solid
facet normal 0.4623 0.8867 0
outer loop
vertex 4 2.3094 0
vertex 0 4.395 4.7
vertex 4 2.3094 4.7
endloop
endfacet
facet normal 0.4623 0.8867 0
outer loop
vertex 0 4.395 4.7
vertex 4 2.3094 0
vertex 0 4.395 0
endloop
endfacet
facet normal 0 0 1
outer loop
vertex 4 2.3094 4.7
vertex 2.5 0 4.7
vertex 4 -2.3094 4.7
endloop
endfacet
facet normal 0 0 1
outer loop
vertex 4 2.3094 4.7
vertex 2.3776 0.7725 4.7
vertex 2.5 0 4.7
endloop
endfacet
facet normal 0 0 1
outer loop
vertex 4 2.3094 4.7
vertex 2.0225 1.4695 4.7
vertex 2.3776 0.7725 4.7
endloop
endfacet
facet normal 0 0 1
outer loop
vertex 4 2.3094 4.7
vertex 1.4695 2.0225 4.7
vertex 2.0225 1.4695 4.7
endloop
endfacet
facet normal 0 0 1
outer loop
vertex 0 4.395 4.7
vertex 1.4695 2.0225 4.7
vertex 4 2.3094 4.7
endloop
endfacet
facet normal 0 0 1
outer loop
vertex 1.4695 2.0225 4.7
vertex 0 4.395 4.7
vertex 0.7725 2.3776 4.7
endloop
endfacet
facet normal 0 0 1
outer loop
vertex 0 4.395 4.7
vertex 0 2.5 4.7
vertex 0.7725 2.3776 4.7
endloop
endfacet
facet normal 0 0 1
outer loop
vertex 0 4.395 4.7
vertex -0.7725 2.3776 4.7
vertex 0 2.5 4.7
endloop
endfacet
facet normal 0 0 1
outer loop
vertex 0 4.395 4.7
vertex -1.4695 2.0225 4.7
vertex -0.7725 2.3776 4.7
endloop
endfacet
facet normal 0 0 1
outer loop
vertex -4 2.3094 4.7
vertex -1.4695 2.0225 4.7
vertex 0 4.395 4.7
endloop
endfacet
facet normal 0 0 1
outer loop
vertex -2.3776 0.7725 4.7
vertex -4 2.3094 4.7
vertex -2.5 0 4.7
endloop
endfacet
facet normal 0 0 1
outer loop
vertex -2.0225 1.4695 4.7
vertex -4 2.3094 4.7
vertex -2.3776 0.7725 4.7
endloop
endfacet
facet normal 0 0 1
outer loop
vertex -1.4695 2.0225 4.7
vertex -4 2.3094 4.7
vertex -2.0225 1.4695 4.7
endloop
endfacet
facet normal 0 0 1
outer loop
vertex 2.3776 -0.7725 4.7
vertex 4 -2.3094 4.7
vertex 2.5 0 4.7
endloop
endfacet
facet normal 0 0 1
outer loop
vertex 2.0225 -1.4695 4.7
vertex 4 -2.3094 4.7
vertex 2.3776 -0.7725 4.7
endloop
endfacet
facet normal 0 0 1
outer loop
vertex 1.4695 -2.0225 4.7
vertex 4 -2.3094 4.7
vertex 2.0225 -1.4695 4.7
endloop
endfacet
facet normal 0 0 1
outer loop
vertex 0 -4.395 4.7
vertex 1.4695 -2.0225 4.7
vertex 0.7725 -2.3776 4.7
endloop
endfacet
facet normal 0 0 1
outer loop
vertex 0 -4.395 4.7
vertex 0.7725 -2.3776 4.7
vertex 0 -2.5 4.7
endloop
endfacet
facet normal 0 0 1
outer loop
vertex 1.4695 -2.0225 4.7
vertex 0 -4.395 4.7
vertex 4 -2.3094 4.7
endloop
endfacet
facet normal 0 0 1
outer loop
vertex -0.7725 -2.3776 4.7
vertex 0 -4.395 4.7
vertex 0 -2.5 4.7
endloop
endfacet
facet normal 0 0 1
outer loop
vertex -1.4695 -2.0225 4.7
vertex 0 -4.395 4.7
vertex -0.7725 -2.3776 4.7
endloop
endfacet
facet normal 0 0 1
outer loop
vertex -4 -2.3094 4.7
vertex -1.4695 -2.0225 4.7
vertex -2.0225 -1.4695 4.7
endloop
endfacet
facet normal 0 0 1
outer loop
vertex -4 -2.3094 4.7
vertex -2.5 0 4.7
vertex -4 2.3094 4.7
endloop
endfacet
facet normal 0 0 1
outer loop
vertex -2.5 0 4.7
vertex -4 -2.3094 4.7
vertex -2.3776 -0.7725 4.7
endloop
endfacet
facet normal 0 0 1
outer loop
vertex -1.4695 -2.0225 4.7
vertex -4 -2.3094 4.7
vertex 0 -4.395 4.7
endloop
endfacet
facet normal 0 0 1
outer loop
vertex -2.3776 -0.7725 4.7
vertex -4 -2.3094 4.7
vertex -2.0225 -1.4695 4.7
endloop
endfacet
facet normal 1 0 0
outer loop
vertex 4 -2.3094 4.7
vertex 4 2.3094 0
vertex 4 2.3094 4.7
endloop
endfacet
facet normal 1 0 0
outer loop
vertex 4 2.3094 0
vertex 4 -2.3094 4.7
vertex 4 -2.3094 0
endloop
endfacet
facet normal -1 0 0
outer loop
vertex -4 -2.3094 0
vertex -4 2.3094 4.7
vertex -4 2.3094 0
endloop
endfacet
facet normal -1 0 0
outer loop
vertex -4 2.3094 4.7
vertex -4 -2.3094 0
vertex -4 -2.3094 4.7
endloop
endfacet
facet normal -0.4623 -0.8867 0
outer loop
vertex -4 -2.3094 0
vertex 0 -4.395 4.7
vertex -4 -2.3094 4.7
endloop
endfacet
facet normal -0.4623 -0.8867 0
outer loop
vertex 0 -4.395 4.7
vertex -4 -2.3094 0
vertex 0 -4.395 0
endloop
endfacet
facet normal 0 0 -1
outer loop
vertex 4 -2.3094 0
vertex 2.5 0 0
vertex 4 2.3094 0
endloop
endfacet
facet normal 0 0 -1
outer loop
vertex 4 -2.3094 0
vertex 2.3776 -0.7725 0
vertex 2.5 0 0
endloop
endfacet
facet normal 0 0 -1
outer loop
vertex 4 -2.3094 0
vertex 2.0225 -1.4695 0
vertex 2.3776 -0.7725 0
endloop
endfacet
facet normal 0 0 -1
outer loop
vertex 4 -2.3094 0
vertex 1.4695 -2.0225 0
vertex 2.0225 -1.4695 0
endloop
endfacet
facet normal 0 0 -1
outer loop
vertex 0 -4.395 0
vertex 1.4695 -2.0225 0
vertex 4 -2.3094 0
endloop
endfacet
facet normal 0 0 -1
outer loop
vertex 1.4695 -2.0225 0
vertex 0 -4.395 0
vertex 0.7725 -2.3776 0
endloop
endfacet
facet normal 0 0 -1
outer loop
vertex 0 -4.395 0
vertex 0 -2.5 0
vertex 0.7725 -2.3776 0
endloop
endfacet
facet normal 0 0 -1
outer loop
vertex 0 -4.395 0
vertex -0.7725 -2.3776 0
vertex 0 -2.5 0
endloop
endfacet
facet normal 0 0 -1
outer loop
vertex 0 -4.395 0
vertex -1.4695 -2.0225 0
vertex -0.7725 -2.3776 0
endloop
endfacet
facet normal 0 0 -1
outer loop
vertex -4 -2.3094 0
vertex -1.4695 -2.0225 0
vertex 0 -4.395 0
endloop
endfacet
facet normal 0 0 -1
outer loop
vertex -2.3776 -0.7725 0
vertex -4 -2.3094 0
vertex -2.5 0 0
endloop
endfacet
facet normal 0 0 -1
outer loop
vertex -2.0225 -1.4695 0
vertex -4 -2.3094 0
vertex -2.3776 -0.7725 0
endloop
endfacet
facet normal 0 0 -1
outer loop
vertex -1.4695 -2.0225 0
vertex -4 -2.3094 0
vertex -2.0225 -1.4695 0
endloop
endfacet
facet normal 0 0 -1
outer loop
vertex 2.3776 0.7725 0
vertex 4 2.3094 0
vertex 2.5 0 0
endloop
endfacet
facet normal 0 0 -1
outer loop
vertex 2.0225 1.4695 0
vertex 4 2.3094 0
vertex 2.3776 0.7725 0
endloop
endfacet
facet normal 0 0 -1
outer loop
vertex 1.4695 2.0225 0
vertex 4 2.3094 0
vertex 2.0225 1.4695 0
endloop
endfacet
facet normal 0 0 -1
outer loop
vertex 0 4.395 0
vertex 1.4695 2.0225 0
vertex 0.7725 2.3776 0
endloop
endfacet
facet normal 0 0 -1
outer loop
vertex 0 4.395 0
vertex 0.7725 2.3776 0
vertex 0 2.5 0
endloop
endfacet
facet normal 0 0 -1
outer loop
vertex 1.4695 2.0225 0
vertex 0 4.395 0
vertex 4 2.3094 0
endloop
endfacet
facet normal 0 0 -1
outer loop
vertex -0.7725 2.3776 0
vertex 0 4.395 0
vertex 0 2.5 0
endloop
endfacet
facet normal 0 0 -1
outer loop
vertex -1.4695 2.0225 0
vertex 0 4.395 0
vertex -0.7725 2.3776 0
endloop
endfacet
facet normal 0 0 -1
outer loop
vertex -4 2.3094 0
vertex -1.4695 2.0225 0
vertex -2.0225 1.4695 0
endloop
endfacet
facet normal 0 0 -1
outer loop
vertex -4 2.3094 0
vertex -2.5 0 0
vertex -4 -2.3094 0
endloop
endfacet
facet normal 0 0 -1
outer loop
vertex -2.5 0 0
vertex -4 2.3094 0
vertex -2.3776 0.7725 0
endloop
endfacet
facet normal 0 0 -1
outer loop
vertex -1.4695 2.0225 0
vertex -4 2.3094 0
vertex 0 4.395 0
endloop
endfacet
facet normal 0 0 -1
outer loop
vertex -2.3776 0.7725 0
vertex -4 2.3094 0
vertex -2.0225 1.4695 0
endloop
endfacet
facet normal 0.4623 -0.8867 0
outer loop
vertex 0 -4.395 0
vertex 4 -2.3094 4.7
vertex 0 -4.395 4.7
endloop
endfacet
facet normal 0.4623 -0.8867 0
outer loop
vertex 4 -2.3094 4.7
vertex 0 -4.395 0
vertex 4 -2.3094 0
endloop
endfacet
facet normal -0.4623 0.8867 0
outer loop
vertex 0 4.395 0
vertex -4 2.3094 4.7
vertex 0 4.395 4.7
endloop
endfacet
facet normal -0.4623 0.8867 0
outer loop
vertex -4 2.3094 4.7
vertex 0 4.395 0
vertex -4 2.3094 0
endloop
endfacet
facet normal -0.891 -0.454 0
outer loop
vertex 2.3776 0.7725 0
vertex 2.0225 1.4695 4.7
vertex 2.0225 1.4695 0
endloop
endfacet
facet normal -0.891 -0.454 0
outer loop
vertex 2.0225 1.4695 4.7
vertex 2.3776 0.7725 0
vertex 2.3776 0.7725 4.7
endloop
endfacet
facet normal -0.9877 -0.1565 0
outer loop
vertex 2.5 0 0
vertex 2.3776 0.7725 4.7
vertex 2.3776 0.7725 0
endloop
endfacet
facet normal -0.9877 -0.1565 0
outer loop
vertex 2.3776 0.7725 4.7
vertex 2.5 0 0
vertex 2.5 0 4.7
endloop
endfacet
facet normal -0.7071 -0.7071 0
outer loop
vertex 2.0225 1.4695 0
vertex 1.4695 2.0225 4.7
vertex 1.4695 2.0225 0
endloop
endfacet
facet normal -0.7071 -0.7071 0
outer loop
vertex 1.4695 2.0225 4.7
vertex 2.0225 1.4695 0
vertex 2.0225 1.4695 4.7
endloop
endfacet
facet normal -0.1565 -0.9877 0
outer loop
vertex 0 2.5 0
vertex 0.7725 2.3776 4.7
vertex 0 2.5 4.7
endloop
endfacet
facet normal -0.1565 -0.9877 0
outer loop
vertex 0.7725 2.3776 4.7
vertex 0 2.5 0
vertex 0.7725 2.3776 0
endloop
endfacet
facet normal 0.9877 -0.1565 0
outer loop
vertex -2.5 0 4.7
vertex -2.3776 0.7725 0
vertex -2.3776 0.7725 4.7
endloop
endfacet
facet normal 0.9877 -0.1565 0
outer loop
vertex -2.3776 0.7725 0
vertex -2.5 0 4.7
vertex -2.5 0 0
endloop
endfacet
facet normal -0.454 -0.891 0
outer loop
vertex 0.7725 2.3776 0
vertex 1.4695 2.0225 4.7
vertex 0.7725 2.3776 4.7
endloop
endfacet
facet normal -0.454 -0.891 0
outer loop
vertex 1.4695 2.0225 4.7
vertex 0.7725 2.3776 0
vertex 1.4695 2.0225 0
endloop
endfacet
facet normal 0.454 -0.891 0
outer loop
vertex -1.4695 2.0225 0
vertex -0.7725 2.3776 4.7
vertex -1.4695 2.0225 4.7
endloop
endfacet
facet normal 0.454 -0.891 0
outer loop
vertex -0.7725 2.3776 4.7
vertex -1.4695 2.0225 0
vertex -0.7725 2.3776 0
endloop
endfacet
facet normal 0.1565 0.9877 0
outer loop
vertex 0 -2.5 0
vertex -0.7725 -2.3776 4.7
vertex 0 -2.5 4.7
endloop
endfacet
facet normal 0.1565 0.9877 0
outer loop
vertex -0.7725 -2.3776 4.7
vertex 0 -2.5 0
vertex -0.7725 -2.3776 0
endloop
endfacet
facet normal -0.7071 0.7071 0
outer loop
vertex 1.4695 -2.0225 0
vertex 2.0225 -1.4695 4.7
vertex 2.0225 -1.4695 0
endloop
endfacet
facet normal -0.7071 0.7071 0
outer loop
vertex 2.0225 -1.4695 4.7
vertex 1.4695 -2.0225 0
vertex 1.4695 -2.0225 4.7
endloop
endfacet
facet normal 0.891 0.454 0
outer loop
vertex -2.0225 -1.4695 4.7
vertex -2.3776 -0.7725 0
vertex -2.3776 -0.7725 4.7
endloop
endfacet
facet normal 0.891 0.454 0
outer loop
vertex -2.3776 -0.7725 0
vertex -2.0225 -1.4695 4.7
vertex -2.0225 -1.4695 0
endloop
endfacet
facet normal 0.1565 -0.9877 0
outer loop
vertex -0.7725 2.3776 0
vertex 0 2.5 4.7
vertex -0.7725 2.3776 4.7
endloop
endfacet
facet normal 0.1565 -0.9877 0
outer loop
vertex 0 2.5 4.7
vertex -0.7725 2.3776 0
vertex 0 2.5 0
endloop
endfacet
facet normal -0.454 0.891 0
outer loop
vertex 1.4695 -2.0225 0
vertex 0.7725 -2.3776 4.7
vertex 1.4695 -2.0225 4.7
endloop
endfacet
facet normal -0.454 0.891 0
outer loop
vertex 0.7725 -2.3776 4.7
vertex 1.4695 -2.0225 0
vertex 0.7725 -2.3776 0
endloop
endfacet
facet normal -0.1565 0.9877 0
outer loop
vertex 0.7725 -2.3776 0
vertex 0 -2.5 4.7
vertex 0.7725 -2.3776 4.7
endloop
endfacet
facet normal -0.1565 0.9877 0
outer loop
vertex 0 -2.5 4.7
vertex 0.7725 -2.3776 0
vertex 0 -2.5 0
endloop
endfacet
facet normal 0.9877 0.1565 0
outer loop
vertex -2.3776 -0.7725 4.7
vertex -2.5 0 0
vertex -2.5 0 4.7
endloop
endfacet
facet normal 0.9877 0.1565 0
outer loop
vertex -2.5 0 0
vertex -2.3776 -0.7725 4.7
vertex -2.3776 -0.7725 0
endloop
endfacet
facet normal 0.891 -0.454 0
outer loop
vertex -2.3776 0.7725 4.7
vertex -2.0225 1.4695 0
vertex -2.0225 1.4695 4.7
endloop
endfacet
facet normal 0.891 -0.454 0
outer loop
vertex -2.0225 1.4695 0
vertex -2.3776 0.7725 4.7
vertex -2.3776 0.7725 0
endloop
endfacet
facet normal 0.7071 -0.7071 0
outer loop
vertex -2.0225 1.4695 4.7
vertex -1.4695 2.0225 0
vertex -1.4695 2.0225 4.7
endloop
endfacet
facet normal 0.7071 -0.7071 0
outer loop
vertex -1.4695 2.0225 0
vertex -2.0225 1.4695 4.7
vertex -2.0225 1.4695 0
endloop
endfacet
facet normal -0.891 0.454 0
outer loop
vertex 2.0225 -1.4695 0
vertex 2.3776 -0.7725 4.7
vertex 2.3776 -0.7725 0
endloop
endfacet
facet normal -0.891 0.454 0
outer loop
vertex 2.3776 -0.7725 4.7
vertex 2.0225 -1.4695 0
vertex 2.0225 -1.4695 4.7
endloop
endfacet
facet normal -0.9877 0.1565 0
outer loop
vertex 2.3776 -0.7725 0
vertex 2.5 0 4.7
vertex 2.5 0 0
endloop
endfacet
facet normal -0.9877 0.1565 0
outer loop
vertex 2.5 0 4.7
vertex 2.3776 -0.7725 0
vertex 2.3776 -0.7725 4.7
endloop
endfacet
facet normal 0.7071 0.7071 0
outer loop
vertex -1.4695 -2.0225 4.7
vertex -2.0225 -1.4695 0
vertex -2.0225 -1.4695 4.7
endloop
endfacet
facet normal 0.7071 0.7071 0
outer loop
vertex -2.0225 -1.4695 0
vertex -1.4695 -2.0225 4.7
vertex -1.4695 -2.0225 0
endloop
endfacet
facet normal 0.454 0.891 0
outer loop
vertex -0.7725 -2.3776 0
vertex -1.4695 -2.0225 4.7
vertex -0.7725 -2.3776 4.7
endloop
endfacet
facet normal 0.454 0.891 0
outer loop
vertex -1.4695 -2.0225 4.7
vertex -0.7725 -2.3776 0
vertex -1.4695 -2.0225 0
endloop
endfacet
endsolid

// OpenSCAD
nut_ac=19;
nut_af=16;
nut_dy=0.5*nut_af*tan(30);
nut_dx=nut_af/2;
nut_h=8.4;
$fn =20;

 module nut(size){
    nut_ac=0;
    nut_af=0;
    nut_h=0;
    //echo("size",size);
     if(size==3){
        nut_ac=6.01;
        nut_af=5.5;
        nut_h=2.4;
         
        nut_dy=0.5*nut_af*tan(30);
        nut_dx=nut_af/2;
     
        color("silver")render()difference(){
        linear_extrude(height=nut_h)polygon([[0,nut_ac/2],[nut_dx,nut_dy],[nut_dx,-nut_dy],[0,-nut_ac/2],[-nut_dx,-nut_dy],[-nut_dx,nut_dy]]);
        
        cylinder(h=nut_h,r=size/2);  
        }
     }
         
     else if(size==5){
        nut_ac=8.79;
        nut_af=8;
        nut_h=4.7;
         
        nut_dy=0.5*nut_af*tan(30);
        nut_dx=nut_af/2;
     
        color("silver")render()difference(){
        linear_extrude(height=nut_h)polygon([[0,nut_ac/2],[nut_dx,nut_dy],[nut_dx,-nut_dy],[0,-nut_ac/2],[-nut_dx,-nut_dy],[-nut_dx,nut_dy]]);
        
        cylinder(h=nut_h,r=size/2);  
        }
     }
     else if(size==10){
        nut_ac=17;
        nut_af=16;
        nut_h=8.4;
         
        nut_dy=0.5*nut_af*tan(30);
        nut_dx=nut_af/2;
     
        color("silver")render()difference(){
        linear_extrude(height=nut_h)polygon([[0,nut_ac/2],[nut_dx,nut_dy],[nut_dx,-nut_dy],[0,-nut_ac/2],[-nut_dx,-nut_dy],[-nut_dx,nut_dy]]);
        echo("nut_ac",nut_ac);
        cylinder(h=nut_h,r=size/2);  
        }
  
     }
     
    
 }



nut(5);
